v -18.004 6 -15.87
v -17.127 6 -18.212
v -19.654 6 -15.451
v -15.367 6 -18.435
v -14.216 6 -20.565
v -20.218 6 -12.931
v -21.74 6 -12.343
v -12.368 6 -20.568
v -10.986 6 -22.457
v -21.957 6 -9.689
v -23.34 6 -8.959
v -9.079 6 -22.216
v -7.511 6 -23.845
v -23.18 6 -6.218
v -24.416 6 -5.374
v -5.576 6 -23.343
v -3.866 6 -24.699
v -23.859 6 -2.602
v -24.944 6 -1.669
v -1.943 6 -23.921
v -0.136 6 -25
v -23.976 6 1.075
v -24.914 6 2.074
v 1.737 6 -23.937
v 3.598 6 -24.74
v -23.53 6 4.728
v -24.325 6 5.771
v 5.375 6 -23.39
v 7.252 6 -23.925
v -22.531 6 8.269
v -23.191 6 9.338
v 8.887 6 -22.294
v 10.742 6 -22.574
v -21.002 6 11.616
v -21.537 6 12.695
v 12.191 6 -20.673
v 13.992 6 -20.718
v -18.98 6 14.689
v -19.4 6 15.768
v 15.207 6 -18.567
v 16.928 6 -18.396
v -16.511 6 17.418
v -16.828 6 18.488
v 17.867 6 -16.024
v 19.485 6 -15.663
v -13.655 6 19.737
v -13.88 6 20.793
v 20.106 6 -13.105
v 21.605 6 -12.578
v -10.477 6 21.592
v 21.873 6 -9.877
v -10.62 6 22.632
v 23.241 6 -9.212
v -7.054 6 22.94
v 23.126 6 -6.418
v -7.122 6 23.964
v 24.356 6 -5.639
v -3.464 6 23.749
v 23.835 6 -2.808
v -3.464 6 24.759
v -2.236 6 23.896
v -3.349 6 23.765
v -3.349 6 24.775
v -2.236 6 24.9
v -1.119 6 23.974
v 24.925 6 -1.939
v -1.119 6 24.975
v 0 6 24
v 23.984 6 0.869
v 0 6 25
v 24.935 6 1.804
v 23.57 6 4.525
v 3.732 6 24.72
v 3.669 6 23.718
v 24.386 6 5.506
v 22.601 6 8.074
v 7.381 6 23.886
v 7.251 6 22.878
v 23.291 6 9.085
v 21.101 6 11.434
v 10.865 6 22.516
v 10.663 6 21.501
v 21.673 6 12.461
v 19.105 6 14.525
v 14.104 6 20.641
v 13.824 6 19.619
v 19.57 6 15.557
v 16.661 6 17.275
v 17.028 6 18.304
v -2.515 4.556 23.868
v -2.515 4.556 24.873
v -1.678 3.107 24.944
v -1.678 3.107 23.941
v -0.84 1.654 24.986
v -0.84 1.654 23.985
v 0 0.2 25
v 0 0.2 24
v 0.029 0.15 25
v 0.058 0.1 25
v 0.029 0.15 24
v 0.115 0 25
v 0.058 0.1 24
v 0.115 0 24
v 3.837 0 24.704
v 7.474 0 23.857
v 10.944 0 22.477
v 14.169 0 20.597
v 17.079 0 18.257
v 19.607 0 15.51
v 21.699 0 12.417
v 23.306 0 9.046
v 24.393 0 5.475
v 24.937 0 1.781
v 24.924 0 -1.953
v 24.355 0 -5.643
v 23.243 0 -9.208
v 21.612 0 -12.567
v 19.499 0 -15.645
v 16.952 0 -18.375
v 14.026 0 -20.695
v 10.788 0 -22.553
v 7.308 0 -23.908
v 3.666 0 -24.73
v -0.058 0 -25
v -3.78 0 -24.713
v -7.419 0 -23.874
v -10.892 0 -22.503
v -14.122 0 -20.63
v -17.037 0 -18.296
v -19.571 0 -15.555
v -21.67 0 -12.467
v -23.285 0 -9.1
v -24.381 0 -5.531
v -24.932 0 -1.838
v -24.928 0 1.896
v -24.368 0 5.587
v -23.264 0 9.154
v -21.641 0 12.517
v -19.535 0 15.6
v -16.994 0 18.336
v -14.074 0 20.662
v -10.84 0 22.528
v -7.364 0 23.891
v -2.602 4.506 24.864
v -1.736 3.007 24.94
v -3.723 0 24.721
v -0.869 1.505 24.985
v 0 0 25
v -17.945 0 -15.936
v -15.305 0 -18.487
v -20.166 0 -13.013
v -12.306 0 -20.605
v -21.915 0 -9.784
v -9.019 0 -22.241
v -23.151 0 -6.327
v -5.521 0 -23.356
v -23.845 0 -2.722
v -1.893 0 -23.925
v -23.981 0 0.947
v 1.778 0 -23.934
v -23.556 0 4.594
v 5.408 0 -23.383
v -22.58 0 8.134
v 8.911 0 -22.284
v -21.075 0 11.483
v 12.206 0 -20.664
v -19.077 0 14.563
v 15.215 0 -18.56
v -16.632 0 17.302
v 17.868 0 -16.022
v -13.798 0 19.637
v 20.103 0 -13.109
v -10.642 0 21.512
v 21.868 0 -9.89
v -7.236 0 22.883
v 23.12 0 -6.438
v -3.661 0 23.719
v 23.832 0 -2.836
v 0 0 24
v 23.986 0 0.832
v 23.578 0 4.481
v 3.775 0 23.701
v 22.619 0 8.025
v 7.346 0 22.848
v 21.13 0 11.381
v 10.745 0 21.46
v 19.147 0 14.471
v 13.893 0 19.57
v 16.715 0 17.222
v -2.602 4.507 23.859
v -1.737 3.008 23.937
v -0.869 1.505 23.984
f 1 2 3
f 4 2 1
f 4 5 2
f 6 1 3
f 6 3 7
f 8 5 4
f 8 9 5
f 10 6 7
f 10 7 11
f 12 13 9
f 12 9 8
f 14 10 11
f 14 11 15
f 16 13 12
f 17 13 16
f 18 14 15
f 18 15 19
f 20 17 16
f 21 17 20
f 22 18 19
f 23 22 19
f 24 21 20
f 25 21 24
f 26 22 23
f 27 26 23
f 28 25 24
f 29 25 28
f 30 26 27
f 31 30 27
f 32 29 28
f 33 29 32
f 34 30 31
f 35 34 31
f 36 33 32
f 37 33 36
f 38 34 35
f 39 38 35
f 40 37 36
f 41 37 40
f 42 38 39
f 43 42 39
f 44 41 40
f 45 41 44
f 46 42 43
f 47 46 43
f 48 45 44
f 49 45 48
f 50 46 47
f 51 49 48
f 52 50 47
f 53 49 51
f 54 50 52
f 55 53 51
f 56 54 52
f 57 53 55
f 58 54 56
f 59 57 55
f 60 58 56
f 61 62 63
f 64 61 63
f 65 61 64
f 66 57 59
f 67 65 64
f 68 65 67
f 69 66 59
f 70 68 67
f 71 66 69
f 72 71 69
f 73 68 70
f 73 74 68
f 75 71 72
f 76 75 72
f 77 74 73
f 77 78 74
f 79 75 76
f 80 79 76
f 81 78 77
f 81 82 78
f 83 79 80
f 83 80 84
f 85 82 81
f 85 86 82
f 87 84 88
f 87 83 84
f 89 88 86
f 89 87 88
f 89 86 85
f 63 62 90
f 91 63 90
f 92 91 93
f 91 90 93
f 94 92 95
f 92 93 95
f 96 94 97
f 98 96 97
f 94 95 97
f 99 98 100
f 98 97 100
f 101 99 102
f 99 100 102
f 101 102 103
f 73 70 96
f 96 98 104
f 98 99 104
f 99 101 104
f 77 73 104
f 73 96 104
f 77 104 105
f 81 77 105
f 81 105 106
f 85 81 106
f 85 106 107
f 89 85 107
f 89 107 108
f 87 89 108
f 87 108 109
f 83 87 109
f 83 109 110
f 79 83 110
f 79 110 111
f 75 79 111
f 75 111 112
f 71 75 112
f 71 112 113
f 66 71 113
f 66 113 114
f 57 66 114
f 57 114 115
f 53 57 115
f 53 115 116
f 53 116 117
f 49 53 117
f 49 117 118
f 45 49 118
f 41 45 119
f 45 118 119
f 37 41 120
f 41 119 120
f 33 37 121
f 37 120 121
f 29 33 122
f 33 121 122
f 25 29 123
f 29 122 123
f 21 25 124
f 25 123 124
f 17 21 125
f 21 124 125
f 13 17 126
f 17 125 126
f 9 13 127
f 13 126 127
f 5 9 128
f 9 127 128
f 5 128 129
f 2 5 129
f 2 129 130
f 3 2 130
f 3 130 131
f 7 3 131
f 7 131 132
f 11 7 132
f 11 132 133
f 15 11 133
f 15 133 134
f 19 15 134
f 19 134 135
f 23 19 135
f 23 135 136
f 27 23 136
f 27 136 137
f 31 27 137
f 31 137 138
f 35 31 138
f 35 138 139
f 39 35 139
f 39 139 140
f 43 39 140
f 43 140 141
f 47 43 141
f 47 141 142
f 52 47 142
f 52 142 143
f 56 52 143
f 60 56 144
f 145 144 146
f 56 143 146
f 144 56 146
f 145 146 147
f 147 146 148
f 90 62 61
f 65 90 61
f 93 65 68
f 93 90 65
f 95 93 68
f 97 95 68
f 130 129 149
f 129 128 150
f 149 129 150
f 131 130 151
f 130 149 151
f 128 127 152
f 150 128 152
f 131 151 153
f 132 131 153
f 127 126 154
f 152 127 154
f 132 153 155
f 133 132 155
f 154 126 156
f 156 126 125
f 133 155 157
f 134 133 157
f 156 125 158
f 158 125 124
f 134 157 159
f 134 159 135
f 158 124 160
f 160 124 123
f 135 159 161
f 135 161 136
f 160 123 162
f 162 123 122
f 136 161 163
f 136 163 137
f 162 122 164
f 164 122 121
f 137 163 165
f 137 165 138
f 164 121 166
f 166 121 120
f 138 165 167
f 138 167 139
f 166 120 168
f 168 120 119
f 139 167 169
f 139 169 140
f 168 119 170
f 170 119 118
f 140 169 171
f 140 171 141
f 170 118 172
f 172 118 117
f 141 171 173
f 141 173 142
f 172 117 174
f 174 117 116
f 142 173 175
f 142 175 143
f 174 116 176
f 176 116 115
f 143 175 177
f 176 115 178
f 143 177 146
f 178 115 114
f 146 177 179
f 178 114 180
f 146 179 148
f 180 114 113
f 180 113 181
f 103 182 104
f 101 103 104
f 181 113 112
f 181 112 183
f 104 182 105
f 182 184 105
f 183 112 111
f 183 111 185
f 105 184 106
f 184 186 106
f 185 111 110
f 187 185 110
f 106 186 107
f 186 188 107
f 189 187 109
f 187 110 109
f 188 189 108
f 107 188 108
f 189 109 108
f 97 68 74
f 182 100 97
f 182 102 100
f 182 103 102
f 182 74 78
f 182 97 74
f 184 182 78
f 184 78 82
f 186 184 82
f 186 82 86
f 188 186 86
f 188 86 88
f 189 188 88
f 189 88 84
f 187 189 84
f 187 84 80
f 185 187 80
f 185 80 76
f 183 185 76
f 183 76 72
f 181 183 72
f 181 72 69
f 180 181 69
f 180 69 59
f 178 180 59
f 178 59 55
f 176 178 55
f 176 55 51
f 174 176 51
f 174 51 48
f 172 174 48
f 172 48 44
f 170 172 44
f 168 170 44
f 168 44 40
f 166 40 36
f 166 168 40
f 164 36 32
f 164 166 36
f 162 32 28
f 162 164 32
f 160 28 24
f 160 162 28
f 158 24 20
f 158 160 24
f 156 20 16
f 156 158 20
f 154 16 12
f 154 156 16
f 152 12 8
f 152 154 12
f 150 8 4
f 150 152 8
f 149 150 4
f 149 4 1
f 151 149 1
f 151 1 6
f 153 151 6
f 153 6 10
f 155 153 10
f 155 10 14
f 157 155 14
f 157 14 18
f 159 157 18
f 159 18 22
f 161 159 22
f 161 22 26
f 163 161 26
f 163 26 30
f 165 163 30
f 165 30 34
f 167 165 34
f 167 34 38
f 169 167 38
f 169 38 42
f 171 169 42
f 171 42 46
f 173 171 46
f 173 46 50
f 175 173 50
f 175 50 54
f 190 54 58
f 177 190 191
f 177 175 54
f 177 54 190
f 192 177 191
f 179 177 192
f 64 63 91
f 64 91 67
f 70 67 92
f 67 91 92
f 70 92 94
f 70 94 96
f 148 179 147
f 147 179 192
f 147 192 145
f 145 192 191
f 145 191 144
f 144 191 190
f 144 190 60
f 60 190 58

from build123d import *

# Parameters (mm, degrees)
SKETCH1_R           = 25
SKETCH1_R_2         = 24
BOSS_EXTRUDE1_DEPTH = 6
CUT_EXTRUDE1_REACH  = 37.861


with BuildPart() as part:
    # Sketch1 → Boss-Extrude1 (new body)
    with BuildSketch(Plane(origin=(0, 0, 0), x_dir=(1, 0, 0), z_dir=(0, 1, 0))):
        with Locations(Location((0, 0, 0), (0, 0, 270))):
            Circle(SKETCH1_R)
        with Locations(Location((0, 0, 0), (0, 0, 270))):
            Circle(SKETCH1_R_2, mode=Mode.SUBTRACT)
    extrude(amount=BOSS_EXTRUDE1_DEPTH)

    # Sketch2 → Cut-Extrude1 (cut, up to next)
    with BuildSketch(Plane.XY, mode=Mode.PRIVATE) as cut_extrude1_sk1:
        Polygon((0, 0), (-3.464101615, 6), (-3.348631561, 6), (0.115470054, 0), align=None)
    cut_extrude1_tool1 = extrude(cut_extrude1_sk1.sketch, amount=CUT_EXTRUDE1_REACH, mode=Mode.PRIVATE) & part.part
    add(cut_extrude1_tool1.solids().sort_by_distance((-1.674316, 3, 0))[0], mode=Mode.SUBTRACT)


solid = part.part
